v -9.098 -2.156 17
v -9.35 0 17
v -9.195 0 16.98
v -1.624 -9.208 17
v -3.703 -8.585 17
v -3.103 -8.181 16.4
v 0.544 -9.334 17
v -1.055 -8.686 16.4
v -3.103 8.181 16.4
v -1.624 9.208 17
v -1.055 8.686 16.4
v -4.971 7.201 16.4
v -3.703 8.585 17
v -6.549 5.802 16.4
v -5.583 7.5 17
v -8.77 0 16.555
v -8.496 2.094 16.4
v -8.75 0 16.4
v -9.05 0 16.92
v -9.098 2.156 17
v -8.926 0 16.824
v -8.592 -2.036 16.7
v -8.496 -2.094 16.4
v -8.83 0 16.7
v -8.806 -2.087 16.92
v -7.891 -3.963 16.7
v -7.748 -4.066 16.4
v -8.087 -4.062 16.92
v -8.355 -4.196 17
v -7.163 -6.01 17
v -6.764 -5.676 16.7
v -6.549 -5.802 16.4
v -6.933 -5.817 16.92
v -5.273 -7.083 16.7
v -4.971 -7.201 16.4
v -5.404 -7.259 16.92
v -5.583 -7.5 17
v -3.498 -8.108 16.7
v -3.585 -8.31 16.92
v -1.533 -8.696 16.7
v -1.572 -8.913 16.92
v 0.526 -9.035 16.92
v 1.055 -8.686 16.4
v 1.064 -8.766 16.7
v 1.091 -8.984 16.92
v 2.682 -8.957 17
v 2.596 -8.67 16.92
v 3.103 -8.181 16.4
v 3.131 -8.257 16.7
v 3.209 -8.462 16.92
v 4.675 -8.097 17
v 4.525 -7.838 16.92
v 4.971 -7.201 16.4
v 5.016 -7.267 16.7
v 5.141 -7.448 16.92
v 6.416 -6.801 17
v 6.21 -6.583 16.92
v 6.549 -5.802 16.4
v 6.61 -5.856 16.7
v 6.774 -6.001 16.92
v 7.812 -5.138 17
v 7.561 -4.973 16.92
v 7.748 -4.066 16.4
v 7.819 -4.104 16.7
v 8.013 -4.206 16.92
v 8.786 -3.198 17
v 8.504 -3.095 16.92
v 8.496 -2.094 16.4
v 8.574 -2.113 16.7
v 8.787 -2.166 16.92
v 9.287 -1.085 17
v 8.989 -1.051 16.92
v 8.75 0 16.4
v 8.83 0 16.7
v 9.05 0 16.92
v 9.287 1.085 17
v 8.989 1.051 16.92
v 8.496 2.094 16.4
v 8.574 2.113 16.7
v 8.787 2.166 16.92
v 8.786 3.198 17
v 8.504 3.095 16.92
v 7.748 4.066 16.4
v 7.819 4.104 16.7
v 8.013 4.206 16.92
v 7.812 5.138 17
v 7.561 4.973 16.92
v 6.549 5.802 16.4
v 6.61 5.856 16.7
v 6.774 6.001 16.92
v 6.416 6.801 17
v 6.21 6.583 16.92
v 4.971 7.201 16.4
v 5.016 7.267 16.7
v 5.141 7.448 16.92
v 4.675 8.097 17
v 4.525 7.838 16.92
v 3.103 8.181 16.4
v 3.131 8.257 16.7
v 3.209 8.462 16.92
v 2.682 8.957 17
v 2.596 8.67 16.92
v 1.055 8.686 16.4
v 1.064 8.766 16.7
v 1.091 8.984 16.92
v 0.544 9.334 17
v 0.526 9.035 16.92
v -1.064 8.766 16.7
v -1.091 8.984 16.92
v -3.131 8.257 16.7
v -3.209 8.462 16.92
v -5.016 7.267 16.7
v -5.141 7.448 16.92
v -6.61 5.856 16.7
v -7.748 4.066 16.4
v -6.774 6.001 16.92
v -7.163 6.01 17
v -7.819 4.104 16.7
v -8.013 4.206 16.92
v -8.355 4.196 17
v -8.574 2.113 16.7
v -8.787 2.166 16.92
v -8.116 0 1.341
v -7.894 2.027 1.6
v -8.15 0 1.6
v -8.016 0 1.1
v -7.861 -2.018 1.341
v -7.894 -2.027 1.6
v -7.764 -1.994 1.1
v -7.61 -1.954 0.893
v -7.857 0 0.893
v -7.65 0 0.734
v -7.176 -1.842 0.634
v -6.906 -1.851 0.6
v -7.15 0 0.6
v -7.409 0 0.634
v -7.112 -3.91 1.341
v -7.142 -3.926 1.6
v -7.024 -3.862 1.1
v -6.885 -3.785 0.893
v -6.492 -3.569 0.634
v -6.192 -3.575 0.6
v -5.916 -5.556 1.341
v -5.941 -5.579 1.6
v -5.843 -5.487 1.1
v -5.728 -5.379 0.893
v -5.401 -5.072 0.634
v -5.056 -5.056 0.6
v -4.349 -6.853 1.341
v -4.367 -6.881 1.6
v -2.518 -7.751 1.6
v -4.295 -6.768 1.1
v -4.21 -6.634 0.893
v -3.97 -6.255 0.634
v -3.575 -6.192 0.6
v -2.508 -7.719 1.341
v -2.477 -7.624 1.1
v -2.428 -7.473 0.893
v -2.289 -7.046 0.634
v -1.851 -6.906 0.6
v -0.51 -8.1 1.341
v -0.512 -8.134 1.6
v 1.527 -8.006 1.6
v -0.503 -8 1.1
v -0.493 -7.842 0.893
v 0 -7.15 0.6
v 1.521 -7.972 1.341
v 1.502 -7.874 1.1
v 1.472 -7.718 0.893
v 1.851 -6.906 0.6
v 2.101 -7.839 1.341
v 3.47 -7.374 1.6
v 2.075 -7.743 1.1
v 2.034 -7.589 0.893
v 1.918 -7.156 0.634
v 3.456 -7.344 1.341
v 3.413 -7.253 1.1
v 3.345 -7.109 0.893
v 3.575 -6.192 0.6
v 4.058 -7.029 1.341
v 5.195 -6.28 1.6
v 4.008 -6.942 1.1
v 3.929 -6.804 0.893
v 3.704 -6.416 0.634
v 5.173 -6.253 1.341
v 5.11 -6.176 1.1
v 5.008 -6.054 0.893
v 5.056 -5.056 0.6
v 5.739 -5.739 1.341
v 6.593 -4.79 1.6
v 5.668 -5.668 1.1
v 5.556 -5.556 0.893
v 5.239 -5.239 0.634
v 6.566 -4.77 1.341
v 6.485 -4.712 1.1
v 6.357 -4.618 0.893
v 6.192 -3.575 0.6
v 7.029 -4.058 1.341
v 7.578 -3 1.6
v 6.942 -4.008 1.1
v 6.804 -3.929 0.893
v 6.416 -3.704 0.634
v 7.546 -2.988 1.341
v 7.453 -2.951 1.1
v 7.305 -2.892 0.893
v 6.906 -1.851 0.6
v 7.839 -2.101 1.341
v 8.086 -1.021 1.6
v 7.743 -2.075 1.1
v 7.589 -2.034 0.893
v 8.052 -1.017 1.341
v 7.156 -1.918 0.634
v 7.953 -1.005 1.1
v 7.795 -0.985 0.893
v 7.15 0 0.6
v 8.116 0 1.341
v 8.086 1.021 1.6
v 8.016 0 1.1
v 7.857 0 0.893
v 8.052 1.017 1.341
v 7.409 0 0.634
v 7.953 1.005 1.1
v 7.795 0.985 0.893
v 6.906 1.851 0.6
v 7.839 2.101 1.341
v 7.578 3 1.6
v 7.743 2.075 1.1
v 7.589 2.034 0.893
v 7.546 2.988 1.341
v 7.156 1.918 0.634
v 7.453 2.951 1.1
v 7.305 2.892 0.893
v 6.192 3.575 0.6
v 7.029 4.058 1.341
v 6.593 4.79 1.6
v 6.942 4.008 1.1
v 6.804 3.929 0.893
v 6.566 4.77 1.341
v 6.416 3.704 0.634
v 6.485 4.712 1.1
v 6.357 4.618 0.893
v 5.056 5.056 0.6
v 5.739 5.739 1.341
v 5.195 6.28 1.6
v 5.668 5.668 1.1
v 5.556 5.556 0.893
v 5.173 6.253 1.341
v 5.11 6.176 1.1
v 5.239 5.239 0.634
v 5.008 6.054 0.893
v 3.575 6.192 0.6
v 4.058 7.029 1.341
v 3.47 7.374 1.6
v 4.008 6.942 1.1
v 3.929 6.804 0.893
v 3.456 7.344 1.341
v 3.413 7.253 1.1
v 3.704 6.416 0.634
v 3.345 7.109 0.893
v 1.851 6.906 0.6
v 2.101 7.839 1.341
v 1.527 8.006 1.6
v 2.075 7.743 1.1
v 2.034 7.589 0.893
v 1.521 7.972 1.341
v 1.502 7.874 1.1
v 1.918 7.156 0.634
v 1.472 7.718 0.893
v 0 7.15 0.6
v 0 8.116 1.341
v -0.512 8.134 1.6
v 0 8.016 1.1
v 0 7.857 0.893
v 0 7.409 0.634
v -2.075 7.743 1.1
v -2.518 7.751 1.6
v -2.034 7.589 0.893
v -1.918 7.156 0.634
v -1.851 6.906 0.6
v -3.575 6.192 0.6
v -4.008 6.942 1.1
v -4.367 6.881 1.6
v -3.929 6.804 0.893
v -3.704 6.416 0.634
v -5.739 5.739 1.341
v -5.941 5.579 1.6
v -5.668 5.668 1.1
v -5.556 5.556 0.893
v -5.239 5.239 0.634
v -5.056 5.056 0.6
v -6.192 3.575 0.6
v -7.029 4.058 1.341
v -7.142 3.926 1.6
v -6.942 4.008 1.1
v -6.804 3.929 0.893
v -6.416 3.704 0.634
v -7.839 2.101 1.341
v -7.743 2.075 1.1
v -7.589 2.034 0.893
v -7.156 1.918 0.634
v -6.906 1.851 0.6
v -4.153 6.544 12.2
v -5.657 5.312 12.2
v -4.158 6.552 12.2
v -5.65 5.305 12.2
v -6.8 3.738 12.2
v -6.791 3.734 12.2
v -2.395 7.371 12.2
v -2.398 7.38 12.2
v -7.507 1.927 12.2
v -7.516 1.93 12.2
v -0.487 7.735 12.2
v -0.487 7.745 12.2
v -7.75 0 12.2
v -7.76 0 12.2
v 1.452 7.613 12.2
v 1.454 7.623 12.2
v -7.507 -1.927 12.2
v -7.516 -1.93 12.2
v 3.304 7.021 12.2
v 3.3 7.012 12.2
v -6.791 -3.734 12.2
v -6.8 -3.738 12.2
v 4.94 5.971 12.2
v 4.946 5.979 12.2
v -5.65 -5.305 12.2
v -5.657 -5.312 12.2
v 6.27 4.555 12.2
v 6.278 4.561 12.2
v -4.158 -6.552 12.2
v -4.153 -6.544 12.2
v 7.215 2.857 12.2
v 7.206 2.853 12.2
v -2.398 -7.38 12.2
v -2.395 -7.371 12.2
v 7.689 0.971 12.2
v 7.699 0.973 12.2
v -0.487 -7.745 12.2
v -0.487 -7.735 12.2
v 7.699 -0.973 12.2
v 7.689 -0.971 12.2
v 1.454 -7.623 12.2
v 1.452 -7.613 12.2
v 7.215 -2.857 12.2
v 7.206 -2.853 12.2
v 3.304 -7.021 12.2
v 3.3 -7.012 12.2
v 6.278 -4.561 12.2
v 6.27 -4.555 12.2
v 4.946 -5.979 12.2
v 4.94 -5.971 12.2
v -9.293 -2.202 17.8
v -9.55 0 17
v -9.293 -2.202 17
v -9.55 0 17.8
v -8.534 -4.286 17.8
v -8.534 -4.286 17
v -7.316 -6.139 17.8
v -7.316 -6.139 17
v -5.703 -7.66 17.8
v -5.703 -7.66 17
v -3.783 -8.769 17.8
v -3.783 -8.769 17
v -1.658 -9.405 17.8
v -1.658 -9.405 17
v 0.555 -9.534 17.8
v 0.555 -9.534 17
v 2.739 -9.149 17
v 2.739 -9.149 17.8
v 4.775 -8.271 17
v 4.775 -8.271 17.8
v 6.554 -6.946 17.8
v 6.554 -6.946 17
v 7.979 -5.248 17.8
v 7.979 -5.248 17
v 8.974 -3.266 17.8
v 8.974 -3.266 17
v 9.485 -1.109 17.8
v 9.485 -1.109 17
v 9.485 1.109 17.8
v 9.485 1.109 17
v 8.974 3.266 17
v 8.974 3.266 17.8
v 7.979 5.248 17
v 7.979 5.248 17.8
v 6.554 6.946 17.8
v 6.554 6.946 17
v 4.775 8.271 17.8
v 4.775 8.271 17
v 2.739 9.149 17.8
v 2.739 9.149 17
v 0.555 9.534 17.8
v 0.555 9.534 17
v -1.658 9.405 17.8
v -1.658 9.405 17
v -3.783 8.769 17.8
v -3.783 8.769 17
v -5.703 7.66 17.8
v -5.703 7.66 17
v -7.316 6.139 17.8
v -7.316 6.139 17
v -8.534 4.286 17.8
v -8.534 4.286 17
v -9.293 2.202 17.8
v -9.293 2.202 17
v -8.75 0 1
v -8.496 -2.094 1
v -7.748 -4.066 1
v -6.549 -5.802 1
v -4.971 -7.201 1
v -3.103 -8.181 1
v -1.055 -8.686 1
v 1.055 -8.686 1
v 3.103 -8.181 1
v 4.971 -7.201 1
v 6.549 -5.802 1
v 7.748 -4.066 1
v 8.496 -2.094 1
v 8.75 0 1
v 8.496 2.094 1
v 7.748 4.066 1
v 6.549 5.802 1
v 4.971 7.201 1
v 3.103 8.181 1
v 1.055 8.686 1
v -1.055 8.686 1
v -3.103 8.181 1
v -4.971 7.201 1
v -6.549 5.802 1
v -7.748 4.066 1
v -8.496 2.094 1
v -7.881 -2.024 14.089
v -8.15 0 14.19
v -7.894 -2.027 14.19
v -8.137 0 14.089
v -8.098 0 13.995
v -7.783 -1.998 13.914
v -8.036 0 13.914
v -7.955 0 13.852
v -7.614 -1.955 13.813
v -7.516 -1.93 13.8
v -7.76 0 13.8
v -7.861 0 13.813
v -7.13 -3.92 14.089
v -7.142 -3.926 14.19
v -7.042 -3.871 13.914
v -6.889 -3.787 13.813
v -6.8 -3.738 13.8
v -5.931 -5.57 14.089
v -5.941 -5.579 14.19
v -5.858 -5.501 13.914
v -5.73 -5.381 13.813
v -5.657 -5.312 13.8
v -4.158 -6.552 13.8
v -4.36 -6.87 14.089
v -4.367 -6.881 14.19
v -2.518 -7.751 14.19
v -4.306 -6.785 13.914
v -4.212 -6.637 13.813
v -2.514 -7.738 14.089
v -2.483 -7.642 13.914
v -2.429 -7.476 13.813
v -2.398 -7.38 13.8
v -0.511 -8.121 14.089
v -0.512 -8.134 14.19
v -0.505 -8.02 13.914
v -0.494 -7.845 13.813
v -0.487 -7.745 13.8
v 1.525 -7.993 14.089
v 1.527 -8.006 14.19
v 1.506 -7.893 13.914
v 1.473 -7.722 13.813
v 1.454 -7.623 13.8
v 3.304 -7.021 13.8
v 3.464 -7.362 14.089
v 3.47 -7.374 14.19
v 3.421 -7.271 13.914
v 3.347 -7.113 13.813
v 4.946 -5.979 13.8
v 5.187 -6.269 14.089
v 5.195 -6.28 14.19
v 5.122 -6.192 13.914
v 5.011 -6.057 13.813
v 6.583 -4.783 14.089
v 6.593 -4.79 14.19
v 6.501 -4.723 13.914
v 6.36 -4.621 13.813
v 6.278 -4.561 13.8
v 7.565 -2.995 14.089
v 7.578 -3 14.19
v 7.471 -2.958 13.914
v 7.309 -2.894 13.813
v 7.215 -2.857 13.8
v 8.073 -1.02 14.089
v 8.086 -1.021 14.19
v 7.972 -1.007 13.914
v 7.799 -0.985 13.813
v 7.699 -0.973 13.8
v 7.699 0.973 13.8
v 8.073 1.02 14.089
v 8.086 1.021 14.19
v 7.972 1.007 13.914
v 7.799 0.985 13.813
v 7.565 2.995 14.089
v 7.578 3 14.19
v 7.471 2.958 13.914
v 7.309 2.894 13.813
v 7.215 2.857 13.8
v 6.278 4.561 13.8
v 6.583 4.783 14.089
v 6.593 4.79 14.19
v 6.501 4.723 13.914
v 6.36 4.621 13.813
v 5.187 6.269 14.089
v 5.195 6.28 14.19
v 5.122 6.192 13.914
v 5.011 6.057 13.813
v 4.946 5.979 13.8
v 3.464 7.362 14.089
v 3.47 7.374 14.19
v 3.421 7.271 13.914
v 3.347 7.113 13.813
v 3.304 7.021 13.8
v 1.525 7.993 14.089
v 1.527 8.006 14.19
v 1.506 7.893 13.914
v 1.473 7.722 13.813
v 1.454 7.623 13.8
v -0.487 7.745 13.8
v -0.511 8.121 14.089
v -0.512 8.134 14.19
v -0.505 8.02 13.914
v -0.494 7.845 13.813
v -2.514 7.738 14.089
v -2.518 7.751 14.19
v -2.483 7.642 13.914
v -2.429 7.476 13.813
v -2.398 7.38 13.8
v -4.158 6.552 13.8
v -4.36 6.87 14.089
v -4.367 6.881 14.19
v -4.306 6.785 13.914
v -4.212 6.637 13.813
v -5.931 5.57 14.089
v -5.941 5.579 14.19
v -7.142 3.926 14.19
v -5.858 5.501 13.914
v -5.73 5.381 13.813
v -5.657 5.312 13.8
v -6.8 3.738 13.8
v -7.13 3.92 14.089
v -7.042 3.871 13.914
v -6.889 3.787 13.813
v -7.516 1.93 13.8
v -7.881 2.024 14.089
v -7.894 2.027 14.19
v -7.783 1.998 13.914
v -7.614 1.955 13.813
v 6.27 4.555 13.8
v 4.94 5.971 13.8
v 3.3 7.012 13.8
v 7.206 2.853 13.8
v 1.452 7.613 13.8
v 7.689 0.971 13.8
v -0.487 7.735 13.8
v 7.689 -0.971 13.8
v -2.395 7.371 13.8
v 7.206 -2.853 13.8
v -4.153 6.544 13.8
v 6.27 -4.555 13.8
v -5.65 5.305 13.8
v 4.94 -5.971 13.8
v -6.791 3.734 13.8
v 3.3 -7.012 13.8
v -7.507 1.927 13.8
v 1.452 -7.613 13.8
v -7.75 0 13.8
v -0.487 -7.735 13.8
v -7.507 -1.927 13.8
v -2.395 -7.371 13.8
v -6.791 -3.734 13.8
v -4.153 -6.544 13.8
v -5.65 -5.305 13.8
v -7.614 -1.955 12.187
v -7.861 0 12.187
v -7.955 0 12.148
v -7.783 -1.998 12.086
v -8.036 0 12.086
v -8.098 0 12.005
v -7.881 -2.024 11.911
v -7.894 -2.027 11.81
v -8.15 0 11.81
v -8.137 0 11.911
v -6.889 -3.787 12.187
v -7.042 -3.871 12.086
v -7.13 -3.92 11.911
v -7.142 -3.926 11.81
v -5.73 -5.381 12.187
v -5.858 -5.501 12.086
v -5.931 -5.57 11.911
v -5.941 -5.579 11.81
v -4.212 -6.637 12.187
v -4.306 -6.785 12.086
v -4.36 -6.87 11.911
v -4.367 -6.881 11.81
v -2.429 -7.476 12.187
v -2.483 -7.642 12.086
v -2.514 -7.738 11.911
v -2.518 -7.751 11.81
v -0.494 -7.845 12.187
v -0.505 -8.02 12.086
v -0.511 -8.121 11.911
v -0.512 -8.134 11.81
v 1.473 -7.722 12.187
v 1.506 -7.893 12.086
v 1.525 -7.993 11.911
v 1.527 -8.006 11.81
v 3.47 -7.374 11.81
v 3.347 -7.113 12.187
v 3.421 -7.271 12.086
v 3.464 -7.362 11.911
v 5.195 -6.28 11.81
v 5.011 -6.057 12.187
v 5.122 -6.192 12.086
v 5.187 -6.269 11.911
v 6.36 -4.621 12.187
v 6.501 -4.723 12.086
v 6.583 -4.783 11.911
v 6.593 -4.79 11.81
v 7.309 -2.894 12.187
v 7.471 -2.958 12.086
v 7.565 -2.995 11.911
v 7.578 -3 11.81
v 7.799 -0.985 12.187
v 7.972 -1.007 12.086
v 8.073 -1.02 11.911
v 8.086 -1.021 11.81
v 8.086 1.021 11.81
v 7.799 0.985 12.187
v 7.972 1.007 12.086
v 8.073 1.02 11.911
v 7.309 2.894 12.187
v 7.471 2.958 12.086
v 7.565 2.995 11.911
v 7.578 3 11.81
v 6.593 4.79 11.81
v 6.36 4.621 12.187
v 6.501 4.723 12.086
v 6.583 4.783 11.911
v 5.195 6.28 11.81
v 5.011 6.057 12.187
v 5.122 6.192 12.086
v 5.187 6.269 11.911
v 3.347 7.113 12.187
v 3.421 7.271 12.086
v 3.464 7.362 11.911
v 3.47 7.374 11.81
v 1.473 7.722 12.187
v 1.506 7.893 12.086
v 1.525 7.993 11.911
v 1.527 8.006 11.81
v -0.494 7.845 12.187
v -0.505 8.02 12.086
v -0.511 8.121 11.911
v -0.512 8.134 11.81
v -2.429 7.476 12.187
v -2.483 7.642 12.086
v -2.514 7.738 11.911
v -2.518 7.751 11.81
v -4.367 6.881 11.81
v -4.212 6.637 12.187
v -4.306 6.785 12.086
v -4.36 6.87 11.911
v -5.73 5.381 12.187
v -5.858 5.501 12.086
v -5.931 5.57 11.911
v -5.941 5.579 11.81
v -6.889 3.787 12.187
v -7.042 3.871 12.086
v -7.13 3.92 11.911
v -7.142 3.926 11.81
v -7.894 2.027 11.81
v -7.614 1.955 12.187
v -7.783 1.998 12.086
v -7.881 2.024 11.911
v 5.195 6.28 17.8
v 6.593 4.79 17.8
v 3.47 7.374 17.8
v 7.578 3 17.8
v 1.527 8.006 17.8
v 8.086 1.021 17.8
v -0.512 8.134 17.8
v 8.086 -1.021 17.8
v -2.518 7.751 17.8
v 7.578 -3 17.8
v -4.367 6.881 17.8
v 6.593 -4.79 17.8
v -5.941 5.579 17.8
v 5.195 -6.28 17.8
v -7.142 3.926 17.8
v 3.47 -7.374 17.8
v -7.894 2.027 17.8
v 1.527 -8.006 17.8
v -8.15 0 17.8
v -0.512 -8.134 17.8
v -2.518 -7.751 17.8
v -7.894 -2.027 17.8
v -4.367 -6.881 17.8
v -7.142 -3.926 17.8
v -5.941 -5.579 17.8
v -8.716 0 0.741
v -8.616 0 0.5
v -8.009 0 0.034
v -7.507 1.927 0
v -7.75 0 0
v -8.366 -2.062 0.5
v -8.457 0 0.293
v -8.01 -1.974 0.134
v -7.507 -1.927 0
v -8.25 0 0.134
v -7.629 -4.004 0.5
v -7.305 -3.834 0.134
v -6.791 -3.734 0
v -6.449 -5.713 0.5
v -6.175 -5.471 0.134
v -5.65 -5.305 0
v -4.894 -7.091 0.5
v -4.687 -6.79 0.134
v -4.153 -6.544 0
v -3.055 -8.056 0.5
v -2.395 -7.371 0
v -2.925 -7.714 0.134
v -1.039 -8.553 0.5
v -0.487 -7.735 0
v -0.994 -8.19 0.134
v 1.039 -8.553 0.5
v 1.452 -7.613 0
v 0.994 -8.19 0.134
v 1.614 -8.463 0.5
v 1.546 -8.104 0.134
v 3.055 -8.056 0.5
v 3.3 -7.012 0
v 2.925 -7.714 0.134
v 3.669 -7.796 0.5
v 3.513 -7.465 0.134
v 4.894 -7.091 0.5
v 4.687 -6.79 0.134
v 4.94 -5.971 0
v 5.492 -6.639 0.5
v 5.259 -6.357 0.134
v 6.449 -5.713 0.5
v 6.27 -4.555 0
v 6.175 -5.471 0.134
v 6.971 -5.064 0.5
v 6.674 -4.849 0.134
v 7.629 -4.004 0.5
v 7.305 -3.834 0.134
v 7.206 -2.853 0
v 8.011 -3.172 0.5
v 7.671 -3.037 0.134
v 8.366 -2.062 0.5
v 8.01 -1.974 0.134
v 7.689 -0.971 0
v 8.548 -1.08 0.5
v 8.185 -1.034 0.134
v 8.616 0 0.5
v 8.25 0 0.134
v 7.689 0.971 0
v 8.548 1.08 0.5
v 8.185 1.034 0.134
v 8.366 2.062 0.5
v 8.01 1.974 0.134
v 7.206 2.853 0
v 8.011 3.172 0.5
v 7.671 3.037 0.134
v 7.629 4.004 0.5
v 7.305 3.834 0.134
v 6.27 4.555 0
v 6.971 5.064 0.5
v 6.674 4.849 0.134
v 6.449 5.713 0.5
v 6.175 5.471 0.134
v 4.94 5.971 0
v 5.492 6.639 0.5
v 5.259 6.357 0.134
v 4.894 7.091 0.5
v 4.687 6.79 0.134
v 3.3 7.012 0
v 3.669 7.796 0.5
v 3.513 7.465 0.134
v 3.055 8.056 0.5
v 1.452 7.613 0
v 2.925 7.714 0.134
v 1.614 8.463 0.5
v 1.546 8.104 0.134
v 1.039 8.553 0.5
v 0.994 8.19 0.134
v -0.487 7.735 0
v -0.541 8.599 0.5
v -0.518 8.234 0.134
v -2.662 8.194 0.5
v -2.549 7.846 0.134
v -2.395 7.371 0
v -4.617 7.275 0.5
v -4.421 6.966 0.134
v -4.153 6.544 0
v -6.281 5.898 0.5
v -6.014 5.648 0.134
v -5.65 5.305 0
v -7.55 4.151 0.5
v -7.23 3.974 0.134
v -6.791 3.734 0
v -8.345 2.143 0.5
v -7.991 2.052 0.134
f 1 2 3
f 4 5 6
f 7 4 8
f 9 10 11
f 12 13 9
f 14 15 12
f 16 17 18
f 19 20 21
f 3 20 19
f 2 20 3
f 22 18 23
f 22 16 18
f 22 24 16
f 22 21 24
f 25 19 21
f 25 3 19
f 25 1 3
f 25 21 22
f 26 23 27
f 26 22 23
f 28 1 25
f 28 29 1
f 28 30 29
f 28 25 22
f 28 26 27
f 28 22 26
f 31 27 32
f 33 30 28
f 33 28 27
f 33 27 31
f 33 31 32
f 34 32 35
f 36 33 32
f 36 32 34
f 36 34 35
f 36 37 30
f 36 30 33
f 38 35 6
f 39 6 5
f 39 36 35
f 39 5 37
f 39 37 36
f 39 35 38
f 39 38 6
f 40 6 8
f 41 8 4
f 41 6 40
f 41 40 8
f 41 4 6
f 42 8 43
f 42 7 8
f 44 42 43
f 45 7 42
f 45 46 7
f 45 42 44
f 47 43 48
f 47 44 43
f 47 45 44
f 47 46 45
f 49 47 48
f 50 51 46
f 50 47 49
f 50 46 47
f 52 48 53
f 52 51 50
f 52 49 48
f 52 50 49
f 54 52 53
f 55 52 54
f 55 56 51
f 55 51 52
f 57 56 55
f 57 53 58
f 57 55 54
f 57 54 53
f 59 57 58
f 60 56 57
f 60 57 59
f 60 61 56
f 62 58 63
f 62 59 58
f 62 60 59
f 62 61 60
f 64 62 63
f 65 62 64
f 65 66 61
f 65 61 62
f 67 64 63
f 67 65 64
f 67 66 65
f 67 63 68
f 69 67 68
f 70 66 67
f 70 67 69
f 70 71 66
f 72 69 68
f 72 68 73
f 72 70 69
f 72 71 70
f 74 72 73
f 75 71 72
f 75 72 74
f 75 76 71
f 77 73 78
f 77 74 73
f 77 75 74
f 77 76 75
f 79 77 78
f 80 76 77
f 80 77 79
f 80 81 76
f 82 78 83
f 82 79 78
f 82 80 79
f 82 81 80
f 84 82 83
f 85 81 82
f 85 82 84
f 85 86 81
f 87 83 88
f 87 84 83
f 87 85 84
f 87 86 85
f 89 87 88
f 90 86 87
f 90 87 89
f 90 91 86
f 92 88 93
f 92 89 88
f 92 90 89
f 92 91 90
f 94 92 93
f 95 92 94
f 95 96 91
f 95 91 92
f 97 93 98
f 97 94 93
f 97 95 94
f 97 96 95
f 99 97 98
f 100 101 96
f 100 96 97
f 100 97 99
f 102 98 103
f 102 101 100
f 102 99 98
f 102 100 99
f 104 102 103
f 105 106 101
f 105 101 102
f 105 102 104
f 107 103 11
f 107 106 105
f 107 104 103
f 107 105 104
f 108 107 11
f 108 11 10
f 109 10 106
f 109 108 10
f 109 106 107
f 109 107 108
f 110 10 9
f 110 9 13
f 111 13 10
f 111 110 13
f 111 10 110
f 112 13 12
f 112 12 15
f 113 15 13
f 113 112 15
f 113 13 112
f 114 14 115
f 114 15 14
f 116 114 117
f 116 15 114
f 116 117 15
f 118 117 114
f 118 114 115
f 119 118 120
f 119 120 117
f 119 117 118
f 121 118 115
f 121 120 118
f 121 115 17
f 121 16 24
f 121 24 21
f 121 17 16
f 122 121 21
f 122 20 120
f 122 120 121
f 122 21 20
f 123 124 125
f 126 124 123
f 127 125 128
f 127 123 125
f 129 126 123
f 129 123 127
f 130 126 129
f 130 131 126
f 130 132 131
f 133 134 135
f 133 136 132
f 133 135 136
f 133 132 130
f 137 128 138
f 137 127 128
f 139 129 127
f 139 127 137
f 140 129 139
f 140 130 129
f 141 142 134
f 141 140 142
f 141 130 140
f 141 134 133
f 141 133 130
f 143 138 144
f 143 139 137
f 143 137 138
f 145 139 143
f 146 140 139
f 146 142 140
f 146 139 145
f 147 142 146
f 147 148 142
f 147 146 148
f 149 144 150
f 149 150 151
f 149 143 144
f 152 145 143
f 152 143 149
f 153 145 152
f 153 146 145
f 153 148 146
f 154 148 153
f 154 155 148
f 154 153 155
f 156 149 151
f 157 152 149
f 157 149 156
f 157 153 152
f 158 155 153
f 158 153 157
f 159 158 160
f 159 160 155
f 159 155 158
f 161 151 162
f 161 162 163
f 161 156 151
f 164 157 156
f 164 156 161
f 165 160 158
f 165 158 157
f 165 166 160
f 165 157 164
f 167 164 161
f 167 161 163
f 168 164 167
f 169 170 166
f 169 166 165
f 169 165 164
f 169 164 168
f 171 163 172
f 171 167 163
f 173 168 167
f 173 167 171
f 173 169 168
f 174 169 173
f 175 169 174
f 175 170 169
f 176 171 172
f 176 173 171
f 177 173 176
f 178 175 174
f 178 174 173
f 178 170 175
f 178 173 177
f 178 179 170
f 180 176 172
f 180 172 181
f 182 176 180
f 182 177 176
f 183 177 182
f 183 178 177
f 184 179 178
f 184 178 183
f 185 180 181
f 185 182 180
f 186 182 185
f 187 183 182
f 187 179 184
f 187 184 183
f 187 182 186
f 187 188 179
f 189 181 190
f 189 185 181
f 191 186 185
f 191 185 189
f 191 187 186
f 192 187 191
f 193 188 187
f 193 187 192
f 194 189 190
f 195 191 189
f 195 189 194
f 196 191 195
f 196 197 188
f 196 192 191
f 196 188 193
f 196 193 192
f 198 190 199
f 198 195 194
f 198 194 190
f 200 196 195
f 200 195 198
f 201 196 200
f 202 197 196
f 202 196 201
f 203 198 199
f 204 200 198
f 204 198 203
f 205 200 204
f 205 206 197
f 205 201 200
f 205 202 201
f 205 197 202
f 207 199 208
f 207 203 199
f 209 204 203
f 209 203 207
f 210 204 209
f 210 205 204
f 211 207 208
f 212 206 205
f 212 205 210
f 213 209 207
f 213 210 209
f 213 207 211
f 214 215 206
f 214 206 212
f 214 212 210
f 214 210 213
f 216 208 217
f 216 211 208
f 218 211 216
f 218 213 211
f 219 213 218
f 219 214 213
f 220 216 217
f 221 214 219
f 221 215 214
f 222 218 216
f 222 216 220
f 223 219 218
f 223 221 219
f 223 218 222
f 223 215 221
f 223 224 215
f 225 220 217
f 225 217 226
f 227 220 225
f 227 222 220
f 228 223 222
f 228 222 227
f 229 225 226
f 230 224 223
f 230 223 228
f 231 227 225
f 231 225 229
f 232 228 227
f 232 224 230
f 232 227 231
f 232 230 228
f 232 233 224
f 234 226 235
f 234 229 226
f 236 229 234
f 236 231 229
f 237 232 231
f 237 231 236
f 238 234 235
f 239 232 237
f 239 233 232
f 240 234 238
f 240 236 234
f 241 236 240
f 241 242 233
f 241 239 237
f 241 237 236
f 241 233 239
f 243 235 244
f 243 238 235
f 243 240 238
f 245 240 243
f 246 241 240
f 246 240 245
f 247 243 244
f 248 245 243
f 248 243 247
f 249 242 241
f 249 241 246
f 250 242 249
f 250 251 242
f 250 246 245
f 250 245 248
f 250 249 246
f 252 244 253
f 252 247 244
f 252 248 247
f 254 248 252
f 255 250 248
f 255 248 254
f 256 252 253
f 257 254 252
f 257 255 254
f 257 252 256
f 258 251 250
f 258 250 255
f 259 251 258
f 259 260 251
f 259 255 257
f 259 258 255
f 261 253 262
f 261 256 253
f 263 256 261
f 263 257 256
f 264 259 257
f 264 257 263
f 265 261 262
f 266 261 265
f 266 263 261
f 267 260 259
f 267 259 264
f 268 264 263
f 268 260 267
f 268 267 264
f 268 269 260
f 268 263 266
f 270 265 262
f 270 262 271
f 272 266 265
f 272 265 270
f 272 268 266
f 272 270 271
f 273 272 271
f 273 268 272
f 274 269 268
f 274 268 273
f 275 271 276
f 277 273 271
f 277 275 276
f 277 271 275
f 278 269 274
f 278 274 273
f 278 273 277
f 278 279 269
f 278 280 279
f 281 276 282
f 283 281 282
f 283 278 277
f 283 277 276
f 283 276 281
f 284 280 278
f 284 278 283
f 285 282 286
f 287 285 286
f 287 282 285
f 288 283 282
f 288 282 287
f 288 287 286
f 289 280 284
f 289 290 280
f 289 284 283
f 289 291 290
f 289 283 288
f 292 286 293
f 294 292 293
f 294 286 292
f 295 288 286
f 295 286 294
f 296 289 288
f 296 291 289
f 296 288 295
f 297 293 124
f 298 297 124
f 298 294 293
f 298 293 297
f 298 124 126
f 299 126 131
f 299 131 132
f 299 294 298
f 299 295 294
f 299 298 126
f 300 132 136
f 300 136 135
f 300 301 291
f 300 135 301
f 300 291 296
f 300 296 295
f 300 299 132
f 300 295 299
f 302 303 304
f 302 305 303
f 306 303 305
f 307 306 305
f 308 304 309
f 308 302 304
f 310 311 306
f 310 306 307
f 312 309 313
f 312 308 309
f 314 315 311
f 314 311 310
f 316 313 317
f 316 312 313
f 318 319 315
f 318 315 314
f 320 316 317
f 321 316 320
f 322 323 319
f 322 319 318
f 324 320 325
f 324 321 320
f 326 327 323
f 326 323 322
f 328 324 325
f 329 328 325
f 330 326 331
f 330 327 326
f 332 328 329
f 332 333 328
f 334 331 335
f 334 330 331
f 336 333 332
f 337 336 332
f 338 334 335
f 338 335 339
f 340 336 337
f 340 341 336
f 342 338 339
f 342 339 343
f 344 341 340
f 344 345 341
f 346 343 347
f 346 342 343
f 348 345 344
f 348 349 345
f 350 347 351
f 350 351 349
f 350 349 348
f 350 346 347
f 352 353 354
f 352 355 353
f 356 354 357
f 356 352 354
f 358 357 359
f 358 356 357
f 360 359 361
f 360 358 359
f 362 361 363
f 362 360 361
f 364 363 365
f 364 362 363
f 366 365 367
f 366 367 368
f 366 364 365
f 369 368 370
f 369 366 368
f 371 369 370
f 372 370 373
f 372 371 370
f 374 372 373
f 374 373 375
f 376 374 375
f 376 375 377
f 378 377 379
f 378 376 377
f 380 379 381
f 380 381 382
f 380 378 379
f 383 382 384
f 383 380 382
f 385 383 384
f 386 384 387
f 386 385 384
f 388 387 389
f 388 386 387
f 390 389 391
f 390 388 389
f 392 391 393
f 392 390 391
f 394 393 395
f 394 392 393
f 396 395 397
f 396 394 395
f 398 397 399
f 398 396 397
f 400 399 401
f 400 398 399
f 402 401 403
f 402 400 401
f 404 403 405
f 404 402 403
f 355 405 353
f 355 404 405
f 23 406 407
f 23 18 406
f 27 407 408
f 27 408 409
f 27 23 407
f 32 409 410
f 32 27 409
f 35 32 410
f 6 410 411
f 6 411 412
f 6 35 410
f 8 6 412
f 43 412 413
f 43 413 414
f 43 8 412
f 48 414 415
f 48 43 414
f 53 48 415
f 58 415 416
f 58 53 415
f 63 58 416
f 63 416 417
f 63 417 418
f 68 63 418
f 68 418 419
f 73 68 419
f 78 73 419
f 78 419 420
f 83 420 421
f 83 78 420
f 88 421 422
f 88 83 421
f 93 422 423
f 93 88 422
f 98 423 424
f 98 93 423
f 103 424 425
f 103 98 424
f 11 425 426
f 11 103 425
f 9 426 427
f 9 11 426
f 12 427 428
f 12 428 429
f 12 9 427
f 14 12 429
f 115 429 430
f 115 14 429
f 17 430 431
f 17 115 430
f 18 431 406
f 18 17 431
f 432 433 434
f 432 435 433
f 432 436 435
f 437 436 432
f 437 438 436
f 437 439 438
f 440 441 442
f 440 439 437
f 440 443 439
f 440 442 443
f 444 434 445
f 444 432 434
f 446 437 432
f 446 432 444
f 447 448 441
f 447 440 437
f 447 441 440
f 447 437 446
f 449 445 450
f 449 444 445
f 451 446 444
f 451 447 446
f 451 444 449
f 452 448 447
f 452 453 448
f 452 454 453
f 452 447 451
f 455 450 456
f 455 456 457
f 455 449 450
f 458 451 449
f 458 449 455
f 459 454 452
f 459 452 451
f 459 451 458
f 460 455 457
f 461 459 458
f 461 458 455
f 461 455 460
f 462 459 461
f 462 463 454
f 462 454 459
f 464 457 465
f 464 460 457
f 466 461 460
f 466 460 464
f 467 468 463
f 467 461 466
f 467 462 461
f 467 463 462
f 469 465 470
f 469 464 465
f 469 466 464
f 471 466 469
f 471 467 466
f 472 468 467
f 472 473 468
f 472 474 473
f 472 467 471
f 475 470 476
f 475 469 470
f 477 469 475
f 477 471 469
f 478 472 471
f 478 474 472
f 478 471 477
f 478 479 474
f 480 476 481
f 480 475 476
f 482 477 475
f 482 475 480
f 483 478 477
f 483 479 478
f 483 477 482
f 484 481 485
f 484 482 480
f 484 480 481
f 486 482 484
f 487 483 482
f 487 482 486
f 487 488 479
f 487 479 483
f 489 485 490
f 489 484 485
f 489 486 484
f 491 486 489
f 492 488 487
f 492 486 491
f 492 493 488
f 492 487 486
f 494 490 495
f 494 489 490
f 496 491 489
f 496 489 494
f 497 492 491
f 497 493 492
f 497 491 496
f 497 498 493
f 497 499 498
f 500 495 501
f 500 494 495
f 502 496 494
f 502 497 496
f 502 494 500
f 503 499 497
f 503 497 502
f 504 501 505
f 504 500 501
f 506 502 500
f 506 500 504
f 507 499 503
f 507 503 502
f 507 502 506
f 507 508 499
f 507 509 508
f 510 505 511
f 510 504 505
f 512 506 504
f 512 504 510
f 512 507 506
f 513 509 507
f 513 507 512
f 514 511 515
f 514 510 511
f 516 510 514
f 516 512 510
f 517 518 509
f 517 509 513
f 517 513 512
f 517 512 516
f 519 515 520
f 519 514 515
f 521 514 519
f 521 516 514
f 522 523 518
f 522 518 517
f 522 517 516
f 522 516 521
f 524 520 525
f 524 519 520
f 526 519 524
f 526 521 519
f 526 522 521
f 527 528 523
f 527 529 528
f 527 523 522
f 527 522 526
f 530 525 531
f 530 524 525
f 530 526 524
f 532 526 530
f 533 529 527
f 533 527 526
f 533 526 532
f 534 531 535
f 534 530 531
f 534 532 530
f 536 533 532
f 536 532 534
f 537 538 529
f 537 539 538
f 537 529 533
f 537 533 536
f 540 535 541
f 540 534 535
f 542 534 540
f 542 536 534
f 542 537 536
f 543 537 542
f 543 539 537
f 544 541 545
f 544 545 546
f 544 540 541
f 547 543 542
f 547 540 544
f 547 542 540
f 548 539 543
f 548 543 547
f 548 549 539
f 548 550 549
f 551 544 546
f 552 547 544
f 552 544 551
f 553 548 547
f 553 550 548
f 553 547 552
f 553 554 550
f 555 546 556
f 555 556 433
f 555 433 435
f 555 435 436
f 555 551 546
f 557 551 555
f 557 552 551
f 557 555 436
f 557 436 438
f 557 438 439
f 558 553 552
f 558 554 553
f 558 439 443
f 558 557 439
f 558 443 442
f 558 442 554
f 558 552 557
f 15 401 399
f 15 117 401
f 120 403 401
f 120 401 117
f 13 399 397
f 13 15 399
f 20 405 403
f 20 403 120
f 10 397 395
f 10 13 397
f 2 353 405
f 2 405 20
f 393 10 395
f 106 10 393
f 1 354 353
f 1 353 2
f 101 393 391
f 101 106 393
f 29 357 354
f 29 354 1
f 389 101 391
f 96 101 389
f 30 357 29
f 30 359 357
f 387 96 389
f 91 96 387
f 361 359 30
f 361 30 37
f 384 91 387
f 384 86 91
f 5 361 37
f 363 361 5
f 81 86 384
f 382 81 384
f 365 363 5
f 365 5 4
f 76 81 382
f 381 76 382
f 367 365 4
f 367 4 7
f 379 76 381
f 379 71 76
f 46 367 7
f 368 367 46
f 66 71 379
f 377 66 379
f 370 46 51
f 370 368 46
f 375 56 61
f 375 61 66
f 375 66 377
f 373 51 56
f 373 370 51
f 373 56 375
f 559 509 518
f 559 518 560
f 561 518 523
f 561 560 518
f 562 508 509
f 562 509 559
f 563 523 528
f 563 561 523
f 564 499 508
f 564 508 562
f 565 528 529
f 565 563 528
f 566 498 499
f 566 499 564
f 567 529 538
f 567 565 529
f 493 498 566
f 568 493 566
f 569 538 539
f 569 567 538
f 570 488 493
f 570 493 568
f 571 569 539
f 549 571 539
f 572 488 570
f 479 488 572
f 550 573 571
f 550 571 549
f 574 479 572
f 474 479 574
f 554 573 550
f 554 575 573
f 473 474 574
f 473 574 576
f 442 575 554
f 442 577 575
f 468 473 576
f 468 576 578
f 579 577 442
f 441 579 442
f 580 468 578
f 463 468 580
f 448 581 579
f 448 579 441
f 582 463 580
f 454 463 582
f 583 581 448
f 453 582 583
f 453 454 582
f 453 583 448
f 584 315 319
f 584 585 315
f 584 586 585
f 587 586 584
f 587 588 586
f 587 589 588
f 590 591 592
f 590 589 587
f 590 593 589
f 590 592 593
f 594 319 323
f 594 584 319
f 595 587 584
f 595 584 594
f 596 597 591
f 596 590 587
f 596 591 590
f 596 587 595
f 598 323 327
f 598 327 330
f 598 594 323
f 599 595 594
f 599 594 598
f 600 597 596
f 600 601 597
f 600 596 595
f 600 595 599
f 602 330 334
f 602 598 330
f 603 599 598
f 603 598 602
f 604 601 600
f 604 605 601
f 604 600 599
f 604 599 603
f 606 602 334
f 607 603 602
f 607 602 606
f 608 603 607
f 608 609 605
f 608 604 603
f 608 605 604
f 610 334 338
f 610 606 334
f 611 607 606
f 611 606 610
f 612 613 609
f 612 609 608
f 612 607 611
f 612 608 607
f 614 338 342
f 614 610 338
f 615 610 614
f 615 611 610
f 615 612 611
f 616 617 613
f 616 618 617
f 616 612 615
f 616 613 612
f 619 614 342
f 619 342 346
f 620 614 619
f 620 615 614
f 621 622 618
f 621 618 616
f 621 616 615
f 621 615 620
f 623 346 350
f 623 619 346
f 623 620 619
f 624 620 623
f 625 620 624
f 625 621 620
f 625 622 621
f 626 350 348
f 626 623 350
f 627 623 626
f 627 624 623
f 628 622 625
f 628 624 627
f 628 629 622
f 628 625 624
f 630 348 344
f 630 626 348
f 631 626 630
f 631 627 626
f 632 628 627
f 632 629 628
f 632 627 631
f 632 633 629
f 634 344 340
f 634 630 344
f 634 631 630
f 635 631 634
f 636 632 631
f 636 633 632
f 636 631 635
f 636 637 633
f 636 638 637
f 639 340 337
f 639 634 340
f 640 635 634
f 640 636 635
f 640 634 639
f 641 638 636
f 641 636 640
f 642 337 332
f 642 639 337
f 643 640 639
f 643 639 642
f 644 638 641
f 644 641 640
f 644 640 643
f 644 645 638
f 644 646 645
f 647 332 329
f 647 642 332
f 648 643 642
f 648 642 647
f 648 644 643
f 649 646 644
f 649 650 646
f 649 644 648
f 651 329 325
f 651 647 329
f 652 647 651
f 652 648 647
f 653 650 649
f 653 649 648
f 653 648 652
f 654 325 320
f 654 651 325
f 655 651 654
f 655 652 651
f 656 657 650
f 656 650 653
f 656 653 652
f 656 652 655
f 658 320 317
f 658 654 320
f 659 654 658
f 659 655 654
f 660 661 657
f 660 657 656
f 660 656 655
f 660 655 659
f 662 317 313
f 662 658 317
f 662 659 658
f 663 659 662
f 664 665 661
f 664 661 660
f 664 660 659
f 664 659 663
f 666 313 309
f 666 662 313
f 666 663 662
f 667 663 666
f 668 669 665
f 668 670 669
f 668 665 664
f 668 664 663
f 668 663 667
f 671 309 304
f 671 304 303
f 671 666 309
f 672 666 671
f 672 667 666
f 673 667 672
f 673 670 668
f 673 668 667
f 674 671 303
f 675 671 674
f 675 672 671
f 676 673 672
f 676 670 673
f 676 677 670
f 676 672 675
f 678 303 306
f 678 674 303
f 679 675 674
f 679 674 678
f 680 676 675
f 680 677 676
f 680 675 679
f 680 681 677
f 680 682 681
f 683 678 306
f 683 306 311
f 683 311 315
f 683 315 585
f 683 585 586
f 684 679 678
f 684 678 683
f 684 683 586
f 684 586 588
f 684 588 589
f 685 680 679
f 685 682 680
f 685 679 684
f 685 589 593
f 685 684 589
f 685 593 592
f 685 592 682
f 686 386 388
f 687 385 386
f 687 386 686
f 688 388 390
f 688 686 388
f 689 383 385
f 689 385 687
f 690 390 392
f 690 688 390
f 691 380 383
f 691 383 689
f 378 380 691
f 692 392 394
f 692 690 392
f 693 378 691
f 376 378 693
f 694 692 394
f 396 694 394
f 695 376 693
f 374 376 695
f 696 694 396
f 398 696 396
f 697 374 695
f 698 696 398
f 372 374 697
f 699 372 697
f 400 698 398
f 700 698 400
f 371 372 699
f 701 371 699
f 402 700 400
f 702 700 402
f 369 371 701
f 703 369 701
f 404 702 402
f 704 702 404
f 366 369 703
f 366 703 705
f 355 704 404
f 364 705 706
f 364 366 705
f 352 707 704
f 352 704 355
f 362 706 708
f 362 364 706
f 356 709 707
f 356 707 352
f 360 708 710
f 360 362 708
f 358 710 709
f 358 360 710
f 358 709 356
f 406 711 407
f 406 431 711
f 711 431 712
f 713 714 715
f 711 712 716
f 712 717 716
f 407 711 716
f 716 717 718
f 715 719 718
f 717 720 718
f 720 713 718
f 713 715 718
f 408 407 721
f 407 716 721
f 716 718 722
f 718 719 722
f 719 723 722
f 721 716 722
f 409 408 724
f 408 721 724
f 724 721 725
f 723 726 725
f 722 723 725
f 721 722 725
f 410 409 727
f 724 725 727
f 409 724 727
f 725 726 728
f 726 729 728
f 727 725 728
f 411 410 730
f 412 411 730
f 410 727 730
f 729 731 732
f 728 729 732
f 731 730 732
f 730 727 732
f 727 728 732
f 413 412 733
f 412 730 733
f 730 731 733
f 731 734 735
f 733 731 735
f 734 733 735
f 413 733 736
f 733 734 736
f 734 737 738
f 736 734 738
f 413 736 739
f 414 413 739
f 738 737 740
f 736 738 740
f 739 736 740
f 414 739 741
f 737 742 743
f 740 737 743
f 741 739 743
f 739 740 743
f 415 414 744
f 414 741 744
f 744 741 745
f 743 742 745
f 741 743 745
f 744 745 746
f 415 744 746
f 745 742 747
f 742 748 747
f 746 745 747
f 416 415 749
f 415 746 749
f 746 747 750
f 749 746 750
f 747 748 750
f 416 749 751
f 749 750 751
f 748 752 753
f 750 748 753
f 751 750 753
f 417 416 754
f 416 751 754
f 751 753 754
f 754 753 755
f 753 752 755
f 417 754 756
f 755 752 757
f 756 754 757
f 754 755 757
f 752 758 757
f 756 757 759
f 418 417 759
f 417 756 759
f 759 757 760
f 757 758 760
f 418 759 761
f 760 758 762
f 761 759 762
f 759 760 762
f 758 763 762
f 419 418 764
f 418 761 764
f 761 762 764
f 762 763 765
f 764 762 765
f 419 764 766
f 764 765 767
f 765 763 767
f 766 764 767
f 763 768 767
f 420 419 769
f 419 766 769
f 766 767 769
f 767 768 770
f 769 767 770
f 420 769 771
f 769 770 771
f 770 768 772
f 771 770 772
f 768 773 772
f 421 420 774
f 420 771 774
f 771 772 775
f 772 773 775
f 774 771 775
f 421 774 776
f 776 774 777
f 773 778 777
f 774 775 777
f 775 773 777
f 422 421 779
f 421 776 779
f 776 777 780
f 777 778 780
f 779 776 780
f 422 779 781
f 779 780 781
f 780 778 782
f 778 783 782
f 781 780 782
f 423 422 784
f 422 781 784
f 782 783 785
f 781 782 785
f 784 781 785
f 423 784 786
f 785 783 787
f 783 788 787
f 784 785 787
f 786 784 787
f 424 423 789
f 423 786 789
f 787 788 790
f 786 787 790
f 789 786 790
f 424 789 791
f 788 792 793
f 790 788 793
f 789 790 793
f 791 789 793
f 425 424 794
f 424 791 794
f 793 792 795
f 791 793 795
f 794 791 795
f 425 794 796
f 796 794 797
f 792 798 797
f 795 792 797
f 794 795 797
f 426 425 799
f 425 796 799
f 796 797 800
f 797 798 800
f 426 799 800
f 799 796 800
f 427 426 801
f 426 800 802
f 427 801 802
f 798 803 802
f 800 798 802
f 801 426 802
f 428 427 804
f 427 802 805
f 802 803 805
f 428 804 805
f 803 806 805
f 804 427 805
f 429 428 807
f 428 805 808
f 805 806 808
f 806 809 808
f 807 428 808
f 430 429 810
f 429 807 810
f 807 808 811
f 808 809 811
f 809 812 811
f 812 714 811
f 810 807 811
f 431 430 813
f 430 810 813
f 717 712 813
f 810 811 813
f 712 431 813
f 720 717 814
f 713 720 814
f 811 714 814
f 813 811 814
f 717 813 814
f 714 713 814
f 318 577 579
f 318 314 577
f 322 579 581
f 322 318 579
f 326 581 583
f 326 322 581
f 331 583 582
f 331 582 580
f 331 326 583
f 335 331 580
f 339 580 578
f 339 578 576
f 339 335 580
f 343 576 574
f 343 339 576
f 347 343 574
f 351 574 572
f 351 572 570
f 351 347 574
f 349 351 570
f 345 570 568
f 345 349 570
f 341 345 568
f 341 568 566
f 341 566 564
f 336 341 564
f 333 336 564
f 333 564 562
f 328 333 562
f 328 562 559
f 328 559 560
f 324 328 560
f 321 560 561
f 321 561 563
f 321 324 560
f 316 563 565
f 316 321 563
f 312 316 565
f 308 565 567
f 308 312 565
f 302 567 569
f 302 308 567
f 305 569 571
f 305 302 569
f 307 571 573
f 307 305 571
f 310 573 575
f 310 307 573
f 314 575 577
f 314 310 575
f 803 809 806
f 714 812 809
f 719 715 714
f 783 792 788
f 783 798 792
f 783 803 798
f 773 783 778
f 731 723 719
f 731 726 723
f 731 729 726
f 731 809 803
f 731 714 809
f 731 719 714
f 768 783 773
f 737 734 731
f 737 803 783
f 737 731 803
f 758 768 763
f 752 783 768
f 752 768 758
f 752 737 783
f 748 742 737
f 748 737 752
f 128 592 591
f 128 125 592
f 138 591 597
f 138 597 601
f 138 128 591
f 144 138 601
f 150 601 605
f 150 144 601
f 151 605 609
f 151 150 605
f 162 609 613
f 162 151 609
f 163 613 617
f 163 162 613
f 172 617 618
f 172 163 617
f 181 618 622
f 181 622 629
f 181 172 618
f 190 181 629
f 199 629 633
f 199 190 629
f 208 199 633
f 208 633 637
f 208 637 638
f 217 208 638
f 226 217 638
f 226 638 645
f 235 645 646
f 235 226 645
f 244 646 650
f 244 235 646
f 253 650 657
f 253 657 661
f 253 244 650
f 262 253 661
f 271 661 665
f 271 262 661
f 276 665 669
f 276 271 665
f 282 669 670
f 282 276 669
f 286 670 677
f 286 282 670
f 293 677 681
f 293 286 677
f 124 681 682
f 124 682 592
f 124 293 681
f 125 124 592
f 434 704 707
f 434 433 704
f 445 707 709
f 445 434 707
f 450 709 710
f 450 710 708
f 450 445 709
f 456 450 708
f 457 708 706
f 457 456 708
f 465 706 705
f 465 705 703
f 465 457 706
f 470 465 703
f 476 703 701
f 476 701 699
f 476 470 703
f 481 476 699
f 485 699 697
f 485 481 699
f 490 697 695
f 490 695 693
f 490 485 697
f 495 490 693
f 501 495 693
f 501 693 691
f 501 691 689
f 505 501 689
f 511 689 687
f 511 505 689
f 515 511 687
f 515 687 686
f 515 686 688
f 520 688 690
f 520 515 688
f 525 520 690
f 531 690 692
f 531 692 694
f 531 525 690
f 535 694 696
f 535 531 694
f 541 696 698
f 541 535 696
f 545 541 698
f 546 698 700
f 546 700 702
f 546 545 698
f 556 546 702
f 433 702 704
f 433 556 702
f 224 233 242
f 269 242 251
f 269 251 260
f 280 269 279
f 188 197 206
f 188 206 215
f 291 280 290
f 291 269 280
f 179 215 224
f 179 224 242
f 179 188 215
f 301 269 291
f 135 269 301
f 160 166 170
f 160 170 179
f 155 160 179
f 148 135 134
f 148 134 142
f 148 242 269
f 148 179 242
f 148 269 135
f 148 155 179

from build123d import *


with BuildPart() as part:
    # Sketch → Revolution (revolve)
    with BuildSketch(Plane.XZ):
        with BuildLine():
            Line((0, 0), (-7.75, 0))
            ThreePointArc((-8.75, 1), (-8.457107, 0.292893), (-7.75, 0))
            Line((-8.75, 1), (-8.75, 16.4))
            ThreePointArc((-8.75, 16.4), (-8.925736, 16.824264), (-9.35, 17))
            Line((-9.35, 17), (-9.55, 17))
            Line((-9.55, 17), (-9.55, 17.8))
            Line((-9.55, 17.8), (-8.15, 17.8))
            Line((-8.15, 17.8), (-8.15, 14.19))
            ThreePointArc((-8.15, 14.19), (-8.035772, 13.914228), (-7.76, 13.8))
            Line((-7.76, 13.8), (-7.75, 13.8))
            Line((-7.75, 13.8), (-7.75, 12.2))
            Line((-7.75, 12.2), (-7.76, 12.2))
            ThreePointArc((-7.76, 12.2), (-8.035772, 12.085772), (-8.15, 11.81))
            Line((-8.15, 11.81), (-8.15, 1.6))
            ThreePointArc((-8.15, 1.6), (-7.857107, 0.892893), (-7.15, 0.6))
            Line((-7.15, 0.6), (0, 0.6))
            Line((0, 0.6), (0, 0))
        make_face()
    revolve(axis=Axis((0, 0, 0), (0, 0, 1)))


solid = part.part
